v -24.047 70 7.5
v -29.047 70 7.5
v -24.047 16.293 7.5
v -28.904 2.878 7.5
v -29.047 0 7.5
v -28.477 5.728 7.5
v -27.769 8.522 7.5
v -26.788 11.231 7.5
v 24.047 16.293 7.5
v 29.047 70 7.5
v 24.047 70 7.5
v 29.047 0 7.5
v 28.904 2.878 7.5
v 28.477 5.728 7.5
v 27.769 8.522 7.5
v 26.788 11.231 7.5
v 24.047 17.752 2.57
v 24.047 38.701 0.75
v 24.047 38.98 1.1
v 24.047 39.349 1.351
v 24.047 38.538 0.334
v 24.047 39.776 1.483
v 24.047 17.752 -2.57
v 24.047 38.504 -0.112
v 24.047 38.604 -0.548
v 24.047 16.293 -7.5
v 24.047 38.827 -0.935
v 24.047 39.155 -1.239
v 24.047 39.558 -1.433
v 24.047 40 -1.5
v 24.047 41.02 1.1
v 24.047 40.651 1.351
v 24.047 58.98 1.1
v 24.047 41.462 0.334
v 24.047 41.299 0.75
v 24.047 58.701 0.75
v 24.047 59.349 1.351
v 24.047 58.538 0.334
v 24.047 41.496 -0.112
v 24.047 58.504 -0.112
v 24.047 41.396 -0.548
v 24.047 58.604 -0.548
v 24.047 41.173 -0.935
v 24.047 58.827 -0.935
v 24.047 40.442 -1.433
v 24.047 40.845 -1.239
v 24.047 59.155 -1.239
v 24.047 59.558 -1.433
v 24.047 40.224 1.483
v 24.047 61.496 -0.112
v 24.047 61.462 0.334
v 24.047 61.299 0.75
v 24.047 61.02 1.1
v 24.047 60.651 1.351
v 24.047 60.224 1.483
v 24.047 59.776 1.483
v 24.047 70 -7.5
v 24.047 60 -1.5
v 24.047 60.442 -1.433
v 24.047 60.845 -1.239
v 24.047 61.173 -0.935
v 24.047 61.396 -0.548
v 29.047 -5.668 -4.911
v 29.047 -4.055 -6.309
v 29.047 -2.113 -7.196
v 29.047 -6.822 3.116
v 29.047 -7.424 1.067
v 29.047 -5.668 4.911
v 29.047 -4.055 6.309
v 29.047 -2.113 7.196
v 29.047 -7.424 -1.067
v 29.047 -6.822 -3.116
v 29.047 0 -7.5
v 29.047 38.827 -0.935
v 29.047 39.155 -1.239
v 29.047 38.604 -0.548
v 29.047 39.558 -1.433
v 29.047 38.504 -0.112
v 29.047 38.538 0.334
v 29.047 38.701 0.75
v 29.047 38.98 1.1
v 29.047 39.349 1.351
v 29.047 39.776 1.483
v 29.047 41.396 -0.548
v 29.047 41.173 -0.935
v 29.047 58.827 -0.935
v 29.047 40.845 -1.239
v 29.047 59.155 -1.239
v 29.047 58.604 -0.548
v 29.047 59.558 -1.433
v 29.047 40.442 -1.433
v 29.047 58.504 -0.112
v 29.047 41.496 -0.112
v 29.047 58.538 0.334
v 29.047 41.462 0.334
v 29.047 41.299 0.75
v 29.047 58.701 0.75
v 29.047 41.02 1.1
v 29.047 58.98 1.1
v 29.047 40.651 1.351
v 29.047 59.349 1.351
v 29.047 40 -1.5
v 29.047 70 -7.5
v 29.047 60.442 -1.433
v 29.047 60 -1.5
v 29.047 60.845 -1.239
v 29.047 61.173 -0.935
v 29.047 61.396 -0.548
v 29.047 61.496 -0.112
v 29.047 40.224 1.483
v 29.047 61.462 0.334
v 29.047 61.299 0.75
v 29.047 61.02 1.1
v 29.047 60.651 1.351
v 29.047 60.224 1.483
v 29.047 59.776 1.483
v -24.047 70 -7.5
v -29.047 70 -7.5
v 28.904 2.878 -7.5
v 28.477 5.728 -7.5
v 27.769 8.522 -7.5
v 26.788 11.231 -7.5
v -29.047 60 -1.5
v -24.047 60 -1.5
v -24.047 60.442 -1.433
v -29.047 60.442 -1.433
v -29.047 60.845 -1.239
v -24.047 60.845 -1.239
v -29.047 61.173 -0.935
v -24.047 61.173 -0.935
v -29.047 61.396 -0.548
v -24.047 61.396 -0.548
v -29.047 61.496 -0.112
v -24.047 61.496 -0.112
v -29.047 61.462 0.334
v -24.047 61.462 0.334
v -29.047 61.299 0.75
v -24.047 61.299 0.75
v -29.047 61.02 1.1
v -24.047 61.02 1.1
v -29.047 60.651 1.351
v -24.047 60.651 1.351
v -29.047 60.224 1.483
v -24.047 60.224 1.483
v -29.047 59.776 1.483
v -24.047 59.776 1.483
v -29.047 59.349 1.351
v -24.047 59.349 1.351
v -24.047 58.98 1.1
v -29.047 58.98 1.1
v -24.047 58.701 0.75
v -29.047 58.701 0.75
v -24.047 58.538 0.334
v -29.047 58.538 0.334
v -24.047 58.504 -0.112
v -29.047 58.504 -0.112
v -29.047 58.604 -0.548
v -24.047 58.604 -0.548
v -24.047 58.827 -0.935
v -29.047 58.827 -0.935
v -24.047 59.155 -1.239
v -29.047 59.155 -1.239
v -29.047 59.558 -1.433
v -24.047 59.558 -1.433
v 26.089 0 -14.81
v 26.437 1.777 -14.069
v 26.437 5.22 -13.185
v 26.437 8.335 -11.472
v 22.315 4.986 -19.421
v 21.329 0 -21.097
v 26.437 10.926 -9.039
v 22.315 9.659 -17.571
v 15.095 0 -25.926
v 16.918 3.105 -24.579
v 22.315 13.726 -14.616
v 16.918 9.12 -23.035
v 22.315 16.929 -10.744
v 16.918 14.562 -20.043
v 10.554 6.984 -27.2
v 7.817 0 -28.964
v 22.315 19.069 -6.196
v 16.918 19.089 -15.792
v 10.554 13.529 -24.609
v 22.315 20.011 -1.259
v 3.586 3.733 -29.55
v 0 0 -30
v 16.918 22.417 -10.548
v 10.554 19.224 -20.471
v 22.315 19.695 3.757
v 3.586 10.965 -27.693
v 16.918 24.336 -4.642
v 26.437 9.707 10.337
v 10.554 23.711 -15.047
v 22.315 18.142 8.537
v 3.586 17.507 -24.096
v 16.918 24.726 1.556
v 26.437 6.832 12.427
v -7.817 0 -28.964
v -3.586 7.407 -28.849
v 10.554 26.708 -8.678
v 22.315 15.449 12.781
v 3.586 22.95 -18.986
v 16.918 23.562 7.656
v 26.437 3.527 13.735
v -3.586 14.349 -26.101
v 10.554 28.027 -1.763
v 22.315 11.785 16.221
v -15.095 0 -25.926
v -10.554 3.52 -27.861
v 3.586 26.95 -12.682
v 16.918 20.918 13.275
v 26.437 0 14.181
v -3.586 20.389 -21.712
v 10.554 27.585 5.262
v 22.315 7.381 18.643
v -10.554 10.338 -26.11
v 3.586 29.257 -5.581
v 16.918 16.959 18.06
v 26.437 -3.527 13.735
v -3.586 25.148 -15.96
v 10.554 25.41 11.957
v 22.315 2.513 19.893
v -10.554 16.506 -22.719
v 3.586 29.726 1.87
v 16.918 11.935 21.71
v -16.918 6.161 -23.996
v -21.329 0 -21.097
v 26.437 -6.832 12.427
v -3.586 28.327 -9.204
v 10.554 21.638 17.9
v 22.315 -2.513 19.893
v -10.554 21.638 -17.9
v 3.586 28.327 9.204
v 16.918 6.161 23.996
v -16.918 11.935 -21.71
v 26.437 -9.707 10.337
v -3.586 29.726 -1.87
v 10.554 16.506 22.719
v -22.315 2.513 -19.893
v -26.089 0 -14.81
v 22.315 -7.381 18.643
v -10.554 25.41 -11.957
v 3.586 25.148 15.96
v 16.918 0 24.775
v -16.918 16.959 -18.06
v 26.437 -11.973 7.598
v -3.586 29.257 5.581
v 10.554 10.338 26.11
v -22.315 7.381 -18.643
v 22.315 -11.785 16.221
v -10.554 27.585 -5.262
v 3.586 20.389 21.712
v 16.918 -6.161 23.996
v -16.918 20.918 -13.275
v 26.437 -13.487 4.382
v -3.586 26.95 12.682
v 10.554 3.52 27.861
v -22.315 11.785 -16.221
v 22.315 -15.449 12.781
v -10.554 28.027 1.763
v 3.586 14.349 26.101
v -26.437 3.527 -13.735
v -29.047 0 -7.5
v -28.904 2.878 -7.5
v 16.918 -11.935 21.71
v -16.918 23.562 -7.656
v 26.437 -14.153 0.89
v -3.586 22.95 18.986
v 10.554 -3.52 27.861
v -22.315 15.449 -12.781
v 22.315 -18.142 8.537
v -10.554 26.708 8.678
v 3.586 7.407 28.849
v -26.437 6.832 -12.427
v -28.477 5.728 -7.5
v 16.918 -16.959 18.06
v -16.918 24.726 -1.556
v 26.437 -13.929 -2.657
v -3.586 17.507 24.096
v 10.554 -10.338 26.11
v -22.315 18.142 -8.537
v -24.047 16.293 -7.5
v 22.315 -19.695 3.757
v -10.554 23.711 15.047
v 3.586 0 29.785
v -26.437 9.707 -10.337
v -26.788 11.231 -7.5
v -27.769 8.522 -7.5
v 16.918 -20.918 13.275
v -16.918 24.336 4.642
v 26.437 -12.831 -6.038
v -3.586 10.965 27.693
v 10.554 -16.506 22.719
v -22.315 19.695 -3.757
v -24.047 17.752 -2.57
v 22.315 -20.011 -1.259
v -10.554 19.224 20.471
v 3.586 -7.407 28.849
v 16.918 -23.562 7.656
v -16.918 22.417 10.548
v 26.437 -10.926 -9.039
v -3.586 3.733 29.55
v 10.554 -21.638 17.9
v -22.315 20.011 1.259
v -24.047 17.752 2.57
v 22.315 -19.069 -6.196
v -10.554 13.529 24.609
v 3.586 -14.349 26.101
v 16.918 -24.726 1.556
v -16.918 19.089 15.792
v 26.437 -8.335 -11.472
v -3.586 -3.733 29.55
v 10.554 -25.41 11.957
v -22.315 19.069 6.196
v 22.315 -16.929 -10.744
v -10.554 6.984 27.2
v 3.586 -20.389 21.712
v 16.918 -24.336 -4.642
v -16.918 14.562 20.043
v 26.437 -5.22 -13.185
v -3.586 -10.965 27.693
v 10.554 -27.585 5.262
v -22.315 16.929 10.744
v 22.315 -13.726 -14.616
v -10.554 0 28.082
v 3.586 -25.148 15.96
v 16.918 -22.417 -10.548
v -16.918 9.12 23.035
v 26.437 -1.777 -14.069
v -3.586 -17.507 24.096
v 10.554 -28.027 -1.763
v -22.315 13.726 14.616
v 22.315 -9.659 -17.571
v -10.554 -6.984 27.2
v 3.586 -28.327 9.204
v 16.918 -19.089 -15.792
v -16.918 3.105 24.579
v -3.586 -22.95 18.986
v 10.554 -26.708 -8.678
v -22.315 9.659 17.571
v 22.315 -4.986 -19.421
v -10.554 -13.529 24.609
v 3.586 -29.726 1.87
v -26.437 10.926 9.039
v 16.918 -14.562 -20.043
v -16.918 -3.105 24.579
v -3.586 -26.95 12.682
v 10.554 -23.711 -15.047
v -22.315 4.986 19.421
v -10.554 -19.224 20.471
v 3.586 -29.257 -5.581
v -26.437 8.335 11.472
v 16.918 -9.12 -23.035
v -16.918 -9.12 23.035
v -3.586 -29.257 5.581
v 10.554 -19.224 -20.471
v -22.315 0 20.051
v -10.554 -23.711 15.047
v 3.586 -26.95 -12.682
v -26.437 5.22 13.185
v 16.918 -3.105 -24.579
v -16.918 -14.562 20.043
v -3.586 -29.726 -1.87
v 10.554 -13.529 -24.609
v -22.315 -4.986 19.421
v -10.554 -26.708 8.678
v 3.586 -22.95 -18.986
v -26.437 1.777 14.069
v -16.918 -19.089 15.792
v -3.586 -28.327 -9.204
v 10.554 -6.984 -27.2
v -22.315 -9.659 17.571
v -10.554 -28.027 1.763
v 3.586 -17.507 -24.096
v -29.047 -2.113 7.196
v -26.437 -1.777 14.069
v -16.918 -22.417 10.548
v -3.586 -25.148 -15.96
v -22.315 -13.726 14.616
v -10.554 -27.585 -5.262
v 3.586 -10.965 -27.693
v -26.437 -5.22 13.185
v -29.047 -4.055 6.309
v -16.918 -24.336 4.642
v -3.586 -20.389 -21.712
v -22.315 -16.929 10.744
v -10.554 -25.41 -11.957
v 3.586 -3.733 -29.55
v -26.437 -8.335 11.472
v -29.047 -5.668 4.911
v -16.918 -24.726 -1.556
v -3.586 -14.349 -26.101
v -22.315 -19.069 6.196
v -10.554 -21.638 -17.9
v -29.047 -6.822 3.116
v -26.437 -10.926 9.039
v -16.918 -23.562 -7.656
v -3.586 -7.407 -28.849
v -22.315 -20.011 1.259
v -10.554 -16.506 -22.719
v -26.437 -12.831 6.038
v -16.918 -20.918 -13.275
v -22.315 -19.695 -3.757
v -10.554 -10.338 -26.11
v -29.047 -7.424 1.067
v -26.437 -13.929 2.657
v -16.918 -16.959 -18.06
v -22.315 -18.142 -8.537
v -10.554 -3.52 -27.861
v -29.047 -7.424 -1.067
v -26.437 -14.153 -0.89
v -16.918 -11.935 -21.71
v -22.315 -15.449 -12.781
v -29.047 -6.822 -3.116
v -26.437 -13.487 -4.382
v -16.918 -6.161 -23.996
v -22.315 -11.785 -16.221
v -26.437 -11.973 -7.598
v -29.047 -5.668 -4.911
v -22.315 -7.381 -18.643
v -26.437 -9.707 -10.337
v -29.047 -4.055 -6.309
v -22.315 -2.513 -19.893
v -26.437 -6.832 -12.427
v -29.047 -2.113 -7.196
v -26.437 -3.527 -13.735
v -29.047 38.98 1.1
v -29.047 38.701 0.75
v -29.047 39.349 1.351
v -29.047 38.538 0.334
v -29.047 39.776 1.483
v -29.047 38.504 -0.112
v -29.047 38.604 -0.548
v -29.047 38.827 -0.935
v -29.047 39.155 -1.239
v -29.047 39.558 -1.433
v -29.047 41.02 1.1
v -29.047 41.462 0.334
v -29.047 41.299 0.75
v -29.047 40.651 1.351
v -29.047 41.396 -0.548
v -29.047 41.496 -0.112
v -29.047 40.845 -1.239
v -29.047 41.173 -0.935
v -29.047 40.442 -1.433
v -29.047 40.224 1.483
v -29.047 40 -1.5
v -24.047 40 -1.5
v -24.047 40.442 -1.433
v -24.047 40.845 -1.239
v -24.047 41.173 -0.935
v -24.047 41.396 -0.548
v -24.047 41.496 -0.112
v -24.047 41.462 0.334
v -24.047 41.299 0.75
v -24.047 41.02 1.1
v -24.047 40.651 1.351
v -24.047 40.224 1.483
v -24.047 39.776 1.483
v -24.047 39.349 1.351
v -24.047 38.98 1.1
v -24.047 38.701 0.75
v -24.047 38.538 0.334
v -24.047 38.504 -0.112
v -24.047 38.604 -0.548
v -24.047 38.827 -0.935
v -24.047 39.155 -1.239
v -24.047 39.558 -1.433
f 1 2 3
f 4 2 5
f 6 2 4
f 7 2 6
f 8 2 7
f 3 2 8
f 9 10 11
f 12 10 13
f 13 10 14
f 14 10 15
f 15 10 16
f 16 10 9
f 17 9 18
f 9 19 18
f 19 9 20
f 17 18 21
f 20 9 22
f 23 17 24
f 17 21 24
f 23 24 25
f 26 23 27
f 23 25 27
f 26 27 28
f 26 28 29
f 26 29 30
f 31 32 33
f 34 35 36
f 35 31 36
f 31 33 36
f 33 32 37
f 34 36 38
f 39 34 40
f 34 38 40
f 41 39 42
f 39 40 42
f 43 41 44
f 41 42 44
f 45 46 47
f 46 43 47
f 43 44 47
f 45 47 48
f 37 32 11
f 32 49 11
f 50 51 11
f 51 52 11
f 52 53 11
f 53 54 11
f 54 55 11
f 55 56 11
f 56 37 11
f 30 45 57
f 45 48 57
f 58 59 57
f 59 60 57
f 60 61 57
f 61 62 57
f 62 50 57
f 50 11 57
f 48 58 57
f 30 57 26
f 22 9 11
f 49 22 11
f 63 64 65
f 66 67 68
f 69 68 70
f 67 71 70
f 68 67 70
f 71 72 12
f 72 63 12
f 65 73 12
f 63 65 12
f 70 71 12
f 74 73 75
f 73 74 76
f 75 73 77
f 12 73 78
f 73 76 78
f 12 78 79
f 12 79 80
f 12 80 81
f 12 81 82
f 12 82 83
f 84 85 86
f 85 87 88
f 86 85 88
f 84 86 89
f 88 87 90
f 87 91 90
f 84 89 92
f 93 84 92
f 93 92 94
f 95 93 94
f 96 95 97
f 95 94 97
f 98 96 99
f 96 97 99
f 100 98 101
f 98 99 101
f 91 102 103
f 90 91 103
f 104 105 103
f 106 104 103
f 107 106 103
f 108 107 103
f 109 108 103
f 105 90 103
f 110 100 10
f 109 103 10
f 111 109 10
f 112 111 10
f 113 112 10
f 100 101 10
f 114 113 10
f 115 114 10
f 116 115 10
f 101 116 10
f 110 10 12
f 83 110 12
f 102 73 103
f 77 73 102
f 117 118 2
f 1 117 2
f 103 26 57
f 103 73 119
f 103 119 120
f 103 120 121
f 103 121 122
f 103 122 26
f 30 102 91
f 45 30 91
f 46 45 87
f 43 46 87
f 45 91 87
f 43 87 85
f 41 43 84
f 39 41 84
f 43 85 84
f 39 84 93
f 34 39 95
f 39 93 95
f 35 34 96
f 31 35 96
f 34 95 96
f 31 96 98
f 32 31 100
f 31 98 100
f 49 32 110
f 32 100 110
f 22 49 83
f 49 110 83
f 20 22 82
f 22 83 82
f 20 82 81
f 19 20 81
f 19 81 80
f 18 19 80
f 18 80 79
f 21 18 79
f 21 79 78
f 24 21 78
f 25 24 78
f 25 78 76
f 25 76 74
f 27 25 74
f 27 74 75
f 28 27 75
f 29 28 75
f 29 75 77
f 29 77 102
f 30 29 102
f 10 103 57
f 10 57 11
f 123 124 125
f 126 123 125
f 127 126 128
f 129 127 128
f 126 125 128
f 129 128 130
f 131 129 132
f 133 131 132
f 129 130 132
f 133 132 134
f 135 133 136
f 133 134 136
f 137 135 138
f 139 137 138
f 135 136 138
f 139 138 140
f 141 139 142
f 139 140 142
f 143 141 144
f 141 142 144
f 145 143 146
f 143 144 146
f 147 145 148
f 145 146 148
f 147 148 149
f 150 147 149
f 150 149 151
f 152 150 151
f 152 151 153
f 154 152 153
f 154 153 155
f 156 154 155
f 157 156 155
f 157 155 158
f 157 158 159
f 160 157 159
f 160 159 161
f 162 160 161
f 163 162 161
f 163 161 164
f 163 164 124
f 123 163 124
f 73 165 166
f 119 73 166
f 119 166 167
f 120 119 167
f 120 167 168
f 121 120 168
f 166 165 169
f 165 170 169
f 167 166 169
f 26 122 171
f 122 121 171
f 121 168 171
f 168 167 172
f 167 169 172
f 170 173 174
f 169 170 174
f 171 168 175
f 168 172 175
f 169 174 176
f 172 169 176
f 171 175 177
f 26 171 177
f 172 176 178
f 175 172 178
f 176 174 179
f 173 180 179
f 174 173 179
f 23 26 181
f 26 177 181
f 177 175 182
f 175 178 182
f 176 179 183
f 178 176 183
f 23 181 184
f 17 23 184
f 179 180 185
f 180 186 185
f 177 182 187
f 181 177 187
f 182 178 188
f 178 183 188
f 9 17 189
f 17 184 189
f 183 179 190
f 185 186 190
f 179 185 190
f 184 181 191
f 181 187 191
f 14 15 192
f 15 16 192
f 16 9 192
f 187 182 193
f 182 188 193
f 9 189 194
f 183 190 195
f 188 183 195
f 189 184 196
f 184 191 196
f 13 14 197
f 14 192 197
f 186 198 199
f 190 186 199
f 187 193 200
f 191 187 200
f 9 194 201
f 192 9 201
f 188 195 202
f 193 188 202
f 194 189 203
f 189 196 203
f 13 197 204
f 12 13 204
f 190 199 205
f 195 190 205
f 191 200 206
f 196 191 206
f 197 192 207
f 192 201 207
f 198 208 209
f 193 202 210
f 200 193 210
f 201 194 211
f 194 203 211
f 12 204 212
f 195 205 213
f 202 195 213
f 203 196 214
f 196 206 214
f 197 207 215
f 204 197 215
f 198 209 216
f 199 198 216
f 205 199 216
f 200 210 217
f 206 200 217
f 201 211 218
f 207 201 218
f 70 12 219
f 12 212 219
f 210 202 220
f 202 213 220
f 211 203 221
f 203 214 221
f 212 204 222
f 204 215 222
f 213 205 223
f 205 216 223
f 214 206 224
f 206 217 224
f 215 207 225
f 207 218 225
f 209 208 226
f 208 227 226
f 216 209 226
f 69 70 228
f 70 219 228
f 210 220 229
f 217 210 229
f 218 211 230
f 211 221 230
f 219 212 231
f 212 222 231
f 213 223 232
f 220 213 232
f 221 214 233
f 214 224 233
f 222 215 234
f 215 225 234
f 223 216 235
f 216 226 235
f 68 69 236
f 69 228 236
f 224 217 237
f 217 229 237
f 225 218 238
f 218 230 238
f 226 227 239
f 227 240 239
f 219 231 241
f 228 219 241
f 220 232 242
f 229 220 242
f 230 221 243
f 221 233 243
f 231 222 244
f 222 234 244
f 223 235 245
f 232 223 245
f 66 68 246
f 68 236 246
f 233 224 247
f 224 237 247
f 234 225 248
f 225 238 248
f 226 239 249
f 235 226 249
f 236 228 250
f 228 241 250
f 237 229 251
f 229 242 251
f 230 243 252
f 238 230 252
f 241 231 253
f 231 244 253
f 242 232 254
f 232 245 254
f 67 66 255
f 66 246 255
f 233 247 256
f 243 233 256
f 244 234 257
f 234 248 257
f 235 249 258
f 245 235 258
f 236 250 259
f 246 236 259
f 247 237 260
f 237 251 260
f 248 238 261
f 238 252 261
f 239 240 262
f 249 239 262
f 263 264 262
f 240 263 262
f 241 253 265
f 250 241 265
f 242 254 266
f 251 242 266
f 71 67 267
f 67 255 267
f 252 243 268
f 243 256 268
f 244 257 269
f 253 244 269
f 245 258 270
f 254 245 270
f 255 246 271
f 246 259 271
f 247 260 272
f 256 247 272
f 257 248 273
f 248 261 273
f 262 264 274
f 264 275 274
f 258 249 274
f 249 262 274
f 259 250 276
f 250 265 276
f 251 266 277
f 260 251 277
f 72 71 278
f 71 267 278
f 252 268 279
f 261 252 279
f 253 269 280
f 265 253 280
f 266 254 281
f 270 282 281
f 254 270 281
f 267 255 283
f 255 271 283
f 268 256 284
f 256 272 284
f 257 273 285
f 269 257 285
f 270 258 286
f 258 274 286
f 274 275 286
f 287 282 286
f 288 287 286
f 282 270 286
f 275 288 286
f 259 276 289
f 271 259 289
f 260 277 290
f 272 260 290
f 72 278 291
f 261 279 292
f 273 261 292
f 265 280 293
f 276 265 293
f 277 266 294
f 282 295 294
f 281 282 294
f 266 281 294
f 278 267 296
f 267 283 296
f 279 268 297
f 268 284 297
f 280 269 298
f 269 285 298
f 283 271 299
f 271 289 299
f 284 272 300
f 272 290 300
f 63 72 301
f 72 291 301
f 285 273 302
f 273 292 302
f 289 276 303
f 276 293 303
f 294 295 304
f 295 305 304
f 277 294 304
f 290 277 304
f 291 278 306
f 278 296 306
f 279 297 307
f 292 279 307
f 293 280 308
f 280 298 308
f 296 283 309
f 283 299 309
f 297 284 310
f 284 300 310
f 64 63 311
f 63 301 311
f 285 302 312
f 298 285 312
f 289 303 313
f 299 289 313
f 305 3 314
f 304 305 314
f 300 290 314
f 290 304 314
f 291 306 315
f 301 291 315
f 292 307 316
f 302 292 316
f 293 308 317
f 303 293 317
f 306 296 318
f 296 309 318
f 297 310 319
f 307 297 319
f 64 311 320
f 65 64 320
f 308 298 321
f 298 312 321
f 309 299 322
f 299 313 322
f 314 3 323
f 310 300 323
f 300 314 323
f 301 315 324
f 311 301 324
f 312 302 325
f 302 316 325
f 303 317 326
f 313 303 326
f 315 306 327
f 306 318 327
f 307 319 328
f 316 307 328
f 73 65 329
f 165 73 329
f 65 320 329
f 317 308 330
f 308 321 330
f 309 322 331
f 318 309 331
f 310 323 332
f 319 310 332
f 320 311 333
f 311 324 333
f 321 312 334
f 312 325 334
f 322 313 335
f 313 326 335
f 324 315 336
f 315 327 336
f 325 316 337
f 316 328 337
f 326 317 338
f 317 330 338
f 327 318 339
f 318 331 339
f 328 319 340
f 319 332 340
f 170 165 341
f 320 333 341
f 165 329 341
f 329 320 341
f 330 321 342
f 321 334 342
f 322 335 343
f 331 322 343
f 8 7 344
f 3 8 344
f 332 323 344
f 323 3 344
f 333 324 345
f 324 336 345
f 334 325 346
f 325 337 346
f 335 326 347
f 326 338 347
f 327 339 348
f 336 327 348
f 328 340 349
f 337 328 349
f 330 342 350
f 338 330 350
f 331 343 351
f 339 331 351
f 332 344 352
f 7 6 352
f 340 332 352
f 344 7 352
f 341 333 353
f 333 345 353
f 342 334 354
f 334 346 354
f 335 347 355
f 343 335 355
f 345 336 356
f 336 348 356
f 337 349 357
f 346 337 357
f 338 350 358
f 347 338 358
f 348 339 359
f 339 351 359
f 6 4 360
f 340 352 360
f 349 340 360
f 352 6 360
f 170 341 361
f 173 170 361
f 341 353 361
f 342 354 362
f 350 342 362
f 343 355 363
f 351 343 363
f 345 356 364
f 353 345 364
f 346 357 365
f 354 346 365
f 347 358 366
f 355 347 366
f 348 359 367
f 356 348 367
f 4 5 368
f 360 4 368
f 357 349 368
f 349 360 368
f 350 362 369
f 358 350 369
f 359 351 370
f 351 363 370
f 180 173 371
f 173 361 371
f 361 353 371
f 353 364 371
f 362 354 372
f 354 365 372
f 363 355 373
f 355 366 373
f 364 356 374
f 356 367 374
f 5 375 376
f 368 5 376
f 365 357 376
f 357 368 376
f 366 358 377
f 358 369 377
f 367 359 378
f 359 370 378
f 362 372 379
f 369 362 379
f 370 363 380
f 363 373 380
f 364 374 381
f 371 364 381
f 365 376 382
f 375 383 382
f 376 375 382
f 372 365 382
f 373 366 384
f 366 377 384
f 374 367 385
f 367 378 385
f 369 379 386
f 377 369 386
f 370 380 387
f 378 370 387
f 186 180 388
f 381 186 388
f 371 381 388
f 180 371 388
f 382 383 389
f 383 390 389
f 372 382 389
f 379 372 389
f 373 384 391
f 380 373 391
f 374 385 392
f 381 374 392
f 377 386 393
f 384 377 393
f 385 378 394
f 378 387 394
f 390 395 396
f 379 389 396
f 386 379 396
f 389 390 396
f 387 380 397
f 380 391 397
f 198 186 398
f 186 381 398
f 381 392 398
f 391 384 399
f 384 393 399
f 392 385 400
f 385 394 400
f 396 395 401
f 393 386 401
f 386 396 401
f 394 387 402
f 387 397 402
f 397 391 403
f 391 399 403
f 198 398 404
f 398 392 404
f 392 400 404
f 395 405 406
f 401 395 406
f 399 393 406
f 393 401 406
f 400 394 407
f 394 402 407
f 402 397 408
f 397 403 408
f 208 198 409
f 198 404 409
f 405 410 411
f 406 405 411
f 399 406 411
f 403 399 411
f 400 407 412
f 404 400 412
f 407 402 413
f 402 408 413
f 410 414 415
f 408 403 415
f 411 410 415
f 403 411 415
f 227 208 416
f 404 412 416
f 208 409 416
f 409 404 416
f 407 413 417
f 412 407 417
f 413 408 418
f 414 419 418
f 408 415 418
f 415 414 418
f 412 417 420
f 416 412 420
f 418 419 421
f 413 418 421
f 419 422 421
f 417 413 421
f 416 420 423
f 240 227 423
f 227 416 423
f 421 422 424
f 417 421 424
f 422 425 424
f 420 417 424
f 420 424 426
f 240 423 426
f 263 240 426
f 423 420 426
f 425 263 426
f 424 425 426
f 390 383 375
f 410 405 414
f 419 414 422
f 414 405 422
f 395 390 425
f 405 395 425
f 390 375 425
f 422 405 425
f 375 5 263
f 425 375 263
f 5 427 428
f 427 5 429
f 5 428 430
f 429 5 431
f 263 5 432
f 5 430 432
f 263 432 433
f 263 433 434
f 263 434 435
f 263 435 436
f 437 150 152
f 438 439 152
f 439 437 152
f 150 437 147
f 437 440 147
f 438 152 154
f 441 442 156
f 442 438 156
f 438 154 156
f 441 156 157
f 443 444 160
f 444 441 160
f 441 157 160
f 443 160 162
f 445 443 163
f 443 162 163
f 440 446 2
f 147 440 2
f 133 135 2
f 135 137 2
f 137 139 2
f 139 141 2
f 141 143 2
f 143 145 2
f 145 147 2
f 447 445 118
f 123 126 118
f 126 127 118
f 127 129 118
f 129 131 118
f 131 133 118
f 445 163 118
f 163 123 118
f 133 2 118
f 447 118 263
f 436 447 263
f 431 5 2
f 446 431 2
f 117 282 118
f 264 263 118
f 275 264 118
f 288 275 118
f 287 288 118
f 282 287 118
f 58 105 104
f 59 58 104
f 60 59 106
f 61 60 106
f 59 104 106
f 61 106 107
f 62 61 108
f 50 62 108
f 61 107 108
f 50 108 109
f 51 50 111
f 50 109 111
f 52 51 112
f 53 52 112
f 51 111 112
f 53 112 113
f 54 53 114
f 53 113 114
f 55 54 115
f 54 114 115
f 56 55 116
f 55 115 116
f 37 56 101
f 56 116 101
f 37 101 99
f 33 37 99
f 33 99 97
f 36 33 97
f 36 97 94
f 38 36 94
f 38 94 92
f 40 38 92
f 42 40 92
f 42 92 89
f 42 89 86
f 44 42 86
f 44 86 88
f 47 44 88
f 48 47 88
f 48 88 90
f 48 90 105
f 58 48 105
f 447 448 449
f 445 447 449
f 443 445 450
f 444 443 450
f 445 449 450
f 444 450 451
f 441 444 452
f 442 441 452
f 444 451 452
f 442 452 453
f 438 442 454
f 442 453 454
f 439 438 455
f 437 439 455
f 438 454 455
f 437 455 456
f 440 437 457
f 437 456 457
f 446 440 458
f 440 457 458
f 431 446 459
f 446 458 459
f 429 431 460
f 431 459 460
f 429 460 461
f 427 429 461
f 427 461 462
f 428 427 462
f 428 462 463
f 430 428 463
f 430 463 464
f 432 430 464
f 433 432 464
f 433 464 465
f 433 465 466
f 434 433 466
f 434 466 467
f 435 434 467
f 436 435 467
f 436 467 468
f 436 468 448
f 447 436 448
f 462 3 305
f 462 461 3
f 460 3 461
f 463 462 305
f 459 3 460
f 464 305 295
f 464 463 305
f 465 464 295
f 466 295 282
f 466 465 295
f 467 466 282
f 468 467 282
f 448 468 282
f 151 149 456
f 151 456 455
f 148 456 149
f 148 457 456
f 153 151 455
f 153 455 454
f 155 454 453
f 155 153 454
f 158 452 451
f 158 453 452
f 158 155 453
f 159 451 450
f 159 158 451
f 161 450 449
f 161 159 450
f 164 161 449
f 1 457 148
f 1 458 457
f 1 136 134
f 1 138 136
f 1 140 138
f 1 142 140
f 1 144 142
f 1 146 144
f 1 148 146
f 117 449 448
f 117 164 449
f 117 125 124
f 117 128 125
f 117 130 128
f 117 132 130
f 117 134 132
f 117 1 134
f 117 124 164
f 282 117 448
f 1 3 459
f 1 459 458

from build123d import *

# Parameters (mm, degrees)
BOSS_EXTRUDE1_DEPTH   = 5
F_3_0MM_DOWEL_HOLE1_D = 3


with BuildPart() as part:
    # Sketch2 → Revolve1 (revolve)
    with BuildSketch(Plane(origin=(0, 0, 0), x_dir=(1, 0, 0), z_dir=(0, 1, 0))):
        with BuildLine():
            Line((29.047375097, 0), (29.047375097, 7.5))
            ThreePointArc((29.047375097, 7.5), (0, 30), (-29.047375097, 7.5))
            Line((-29.047375097, 7.5), (-29.047375097, 0))
            Line((-29.047375097, 0), (29.047375097, 0))
        make_face()
    revolve(axis=Axis((-29.047375097, 0, 0), (1, 0, 0)))

    # Sketch3 → Boss-Extrude1 (add)
    with BuildSketch(Plane.ZY.offset(29.047375097)):
        with BuildLine():
            Line((-7.5, 0), (-7.5, 70))
            Line((-7.5, 70), (7.5, 70))
            Line((7.5, 70), (7.5, 0))
            ThreePointArc((7.5, 0), (0, -7.5), (-7.5, 0))
        make_face()
    boss_extrude1 = extrude(amount=-BOSS_EXTRUDE1_DEPTH)

    # Mirror1: Boss-Extrude1 across plane
    add(boss_extrude1.mirror(Plane(origin=(0, 0, 0), x_dir=(0, 0, 1), z_dir=(1, 0, 0))))

    # Ø3.0mm Dowel Hole1 (through all)
    with Locations(Plane.ZY.offset(29.047375097)):
        with Locations((0, 60), (0, 40)):
            Hole(F_3_0MM_DOWEL_HOLE1_D / 2)


solid = part.part
